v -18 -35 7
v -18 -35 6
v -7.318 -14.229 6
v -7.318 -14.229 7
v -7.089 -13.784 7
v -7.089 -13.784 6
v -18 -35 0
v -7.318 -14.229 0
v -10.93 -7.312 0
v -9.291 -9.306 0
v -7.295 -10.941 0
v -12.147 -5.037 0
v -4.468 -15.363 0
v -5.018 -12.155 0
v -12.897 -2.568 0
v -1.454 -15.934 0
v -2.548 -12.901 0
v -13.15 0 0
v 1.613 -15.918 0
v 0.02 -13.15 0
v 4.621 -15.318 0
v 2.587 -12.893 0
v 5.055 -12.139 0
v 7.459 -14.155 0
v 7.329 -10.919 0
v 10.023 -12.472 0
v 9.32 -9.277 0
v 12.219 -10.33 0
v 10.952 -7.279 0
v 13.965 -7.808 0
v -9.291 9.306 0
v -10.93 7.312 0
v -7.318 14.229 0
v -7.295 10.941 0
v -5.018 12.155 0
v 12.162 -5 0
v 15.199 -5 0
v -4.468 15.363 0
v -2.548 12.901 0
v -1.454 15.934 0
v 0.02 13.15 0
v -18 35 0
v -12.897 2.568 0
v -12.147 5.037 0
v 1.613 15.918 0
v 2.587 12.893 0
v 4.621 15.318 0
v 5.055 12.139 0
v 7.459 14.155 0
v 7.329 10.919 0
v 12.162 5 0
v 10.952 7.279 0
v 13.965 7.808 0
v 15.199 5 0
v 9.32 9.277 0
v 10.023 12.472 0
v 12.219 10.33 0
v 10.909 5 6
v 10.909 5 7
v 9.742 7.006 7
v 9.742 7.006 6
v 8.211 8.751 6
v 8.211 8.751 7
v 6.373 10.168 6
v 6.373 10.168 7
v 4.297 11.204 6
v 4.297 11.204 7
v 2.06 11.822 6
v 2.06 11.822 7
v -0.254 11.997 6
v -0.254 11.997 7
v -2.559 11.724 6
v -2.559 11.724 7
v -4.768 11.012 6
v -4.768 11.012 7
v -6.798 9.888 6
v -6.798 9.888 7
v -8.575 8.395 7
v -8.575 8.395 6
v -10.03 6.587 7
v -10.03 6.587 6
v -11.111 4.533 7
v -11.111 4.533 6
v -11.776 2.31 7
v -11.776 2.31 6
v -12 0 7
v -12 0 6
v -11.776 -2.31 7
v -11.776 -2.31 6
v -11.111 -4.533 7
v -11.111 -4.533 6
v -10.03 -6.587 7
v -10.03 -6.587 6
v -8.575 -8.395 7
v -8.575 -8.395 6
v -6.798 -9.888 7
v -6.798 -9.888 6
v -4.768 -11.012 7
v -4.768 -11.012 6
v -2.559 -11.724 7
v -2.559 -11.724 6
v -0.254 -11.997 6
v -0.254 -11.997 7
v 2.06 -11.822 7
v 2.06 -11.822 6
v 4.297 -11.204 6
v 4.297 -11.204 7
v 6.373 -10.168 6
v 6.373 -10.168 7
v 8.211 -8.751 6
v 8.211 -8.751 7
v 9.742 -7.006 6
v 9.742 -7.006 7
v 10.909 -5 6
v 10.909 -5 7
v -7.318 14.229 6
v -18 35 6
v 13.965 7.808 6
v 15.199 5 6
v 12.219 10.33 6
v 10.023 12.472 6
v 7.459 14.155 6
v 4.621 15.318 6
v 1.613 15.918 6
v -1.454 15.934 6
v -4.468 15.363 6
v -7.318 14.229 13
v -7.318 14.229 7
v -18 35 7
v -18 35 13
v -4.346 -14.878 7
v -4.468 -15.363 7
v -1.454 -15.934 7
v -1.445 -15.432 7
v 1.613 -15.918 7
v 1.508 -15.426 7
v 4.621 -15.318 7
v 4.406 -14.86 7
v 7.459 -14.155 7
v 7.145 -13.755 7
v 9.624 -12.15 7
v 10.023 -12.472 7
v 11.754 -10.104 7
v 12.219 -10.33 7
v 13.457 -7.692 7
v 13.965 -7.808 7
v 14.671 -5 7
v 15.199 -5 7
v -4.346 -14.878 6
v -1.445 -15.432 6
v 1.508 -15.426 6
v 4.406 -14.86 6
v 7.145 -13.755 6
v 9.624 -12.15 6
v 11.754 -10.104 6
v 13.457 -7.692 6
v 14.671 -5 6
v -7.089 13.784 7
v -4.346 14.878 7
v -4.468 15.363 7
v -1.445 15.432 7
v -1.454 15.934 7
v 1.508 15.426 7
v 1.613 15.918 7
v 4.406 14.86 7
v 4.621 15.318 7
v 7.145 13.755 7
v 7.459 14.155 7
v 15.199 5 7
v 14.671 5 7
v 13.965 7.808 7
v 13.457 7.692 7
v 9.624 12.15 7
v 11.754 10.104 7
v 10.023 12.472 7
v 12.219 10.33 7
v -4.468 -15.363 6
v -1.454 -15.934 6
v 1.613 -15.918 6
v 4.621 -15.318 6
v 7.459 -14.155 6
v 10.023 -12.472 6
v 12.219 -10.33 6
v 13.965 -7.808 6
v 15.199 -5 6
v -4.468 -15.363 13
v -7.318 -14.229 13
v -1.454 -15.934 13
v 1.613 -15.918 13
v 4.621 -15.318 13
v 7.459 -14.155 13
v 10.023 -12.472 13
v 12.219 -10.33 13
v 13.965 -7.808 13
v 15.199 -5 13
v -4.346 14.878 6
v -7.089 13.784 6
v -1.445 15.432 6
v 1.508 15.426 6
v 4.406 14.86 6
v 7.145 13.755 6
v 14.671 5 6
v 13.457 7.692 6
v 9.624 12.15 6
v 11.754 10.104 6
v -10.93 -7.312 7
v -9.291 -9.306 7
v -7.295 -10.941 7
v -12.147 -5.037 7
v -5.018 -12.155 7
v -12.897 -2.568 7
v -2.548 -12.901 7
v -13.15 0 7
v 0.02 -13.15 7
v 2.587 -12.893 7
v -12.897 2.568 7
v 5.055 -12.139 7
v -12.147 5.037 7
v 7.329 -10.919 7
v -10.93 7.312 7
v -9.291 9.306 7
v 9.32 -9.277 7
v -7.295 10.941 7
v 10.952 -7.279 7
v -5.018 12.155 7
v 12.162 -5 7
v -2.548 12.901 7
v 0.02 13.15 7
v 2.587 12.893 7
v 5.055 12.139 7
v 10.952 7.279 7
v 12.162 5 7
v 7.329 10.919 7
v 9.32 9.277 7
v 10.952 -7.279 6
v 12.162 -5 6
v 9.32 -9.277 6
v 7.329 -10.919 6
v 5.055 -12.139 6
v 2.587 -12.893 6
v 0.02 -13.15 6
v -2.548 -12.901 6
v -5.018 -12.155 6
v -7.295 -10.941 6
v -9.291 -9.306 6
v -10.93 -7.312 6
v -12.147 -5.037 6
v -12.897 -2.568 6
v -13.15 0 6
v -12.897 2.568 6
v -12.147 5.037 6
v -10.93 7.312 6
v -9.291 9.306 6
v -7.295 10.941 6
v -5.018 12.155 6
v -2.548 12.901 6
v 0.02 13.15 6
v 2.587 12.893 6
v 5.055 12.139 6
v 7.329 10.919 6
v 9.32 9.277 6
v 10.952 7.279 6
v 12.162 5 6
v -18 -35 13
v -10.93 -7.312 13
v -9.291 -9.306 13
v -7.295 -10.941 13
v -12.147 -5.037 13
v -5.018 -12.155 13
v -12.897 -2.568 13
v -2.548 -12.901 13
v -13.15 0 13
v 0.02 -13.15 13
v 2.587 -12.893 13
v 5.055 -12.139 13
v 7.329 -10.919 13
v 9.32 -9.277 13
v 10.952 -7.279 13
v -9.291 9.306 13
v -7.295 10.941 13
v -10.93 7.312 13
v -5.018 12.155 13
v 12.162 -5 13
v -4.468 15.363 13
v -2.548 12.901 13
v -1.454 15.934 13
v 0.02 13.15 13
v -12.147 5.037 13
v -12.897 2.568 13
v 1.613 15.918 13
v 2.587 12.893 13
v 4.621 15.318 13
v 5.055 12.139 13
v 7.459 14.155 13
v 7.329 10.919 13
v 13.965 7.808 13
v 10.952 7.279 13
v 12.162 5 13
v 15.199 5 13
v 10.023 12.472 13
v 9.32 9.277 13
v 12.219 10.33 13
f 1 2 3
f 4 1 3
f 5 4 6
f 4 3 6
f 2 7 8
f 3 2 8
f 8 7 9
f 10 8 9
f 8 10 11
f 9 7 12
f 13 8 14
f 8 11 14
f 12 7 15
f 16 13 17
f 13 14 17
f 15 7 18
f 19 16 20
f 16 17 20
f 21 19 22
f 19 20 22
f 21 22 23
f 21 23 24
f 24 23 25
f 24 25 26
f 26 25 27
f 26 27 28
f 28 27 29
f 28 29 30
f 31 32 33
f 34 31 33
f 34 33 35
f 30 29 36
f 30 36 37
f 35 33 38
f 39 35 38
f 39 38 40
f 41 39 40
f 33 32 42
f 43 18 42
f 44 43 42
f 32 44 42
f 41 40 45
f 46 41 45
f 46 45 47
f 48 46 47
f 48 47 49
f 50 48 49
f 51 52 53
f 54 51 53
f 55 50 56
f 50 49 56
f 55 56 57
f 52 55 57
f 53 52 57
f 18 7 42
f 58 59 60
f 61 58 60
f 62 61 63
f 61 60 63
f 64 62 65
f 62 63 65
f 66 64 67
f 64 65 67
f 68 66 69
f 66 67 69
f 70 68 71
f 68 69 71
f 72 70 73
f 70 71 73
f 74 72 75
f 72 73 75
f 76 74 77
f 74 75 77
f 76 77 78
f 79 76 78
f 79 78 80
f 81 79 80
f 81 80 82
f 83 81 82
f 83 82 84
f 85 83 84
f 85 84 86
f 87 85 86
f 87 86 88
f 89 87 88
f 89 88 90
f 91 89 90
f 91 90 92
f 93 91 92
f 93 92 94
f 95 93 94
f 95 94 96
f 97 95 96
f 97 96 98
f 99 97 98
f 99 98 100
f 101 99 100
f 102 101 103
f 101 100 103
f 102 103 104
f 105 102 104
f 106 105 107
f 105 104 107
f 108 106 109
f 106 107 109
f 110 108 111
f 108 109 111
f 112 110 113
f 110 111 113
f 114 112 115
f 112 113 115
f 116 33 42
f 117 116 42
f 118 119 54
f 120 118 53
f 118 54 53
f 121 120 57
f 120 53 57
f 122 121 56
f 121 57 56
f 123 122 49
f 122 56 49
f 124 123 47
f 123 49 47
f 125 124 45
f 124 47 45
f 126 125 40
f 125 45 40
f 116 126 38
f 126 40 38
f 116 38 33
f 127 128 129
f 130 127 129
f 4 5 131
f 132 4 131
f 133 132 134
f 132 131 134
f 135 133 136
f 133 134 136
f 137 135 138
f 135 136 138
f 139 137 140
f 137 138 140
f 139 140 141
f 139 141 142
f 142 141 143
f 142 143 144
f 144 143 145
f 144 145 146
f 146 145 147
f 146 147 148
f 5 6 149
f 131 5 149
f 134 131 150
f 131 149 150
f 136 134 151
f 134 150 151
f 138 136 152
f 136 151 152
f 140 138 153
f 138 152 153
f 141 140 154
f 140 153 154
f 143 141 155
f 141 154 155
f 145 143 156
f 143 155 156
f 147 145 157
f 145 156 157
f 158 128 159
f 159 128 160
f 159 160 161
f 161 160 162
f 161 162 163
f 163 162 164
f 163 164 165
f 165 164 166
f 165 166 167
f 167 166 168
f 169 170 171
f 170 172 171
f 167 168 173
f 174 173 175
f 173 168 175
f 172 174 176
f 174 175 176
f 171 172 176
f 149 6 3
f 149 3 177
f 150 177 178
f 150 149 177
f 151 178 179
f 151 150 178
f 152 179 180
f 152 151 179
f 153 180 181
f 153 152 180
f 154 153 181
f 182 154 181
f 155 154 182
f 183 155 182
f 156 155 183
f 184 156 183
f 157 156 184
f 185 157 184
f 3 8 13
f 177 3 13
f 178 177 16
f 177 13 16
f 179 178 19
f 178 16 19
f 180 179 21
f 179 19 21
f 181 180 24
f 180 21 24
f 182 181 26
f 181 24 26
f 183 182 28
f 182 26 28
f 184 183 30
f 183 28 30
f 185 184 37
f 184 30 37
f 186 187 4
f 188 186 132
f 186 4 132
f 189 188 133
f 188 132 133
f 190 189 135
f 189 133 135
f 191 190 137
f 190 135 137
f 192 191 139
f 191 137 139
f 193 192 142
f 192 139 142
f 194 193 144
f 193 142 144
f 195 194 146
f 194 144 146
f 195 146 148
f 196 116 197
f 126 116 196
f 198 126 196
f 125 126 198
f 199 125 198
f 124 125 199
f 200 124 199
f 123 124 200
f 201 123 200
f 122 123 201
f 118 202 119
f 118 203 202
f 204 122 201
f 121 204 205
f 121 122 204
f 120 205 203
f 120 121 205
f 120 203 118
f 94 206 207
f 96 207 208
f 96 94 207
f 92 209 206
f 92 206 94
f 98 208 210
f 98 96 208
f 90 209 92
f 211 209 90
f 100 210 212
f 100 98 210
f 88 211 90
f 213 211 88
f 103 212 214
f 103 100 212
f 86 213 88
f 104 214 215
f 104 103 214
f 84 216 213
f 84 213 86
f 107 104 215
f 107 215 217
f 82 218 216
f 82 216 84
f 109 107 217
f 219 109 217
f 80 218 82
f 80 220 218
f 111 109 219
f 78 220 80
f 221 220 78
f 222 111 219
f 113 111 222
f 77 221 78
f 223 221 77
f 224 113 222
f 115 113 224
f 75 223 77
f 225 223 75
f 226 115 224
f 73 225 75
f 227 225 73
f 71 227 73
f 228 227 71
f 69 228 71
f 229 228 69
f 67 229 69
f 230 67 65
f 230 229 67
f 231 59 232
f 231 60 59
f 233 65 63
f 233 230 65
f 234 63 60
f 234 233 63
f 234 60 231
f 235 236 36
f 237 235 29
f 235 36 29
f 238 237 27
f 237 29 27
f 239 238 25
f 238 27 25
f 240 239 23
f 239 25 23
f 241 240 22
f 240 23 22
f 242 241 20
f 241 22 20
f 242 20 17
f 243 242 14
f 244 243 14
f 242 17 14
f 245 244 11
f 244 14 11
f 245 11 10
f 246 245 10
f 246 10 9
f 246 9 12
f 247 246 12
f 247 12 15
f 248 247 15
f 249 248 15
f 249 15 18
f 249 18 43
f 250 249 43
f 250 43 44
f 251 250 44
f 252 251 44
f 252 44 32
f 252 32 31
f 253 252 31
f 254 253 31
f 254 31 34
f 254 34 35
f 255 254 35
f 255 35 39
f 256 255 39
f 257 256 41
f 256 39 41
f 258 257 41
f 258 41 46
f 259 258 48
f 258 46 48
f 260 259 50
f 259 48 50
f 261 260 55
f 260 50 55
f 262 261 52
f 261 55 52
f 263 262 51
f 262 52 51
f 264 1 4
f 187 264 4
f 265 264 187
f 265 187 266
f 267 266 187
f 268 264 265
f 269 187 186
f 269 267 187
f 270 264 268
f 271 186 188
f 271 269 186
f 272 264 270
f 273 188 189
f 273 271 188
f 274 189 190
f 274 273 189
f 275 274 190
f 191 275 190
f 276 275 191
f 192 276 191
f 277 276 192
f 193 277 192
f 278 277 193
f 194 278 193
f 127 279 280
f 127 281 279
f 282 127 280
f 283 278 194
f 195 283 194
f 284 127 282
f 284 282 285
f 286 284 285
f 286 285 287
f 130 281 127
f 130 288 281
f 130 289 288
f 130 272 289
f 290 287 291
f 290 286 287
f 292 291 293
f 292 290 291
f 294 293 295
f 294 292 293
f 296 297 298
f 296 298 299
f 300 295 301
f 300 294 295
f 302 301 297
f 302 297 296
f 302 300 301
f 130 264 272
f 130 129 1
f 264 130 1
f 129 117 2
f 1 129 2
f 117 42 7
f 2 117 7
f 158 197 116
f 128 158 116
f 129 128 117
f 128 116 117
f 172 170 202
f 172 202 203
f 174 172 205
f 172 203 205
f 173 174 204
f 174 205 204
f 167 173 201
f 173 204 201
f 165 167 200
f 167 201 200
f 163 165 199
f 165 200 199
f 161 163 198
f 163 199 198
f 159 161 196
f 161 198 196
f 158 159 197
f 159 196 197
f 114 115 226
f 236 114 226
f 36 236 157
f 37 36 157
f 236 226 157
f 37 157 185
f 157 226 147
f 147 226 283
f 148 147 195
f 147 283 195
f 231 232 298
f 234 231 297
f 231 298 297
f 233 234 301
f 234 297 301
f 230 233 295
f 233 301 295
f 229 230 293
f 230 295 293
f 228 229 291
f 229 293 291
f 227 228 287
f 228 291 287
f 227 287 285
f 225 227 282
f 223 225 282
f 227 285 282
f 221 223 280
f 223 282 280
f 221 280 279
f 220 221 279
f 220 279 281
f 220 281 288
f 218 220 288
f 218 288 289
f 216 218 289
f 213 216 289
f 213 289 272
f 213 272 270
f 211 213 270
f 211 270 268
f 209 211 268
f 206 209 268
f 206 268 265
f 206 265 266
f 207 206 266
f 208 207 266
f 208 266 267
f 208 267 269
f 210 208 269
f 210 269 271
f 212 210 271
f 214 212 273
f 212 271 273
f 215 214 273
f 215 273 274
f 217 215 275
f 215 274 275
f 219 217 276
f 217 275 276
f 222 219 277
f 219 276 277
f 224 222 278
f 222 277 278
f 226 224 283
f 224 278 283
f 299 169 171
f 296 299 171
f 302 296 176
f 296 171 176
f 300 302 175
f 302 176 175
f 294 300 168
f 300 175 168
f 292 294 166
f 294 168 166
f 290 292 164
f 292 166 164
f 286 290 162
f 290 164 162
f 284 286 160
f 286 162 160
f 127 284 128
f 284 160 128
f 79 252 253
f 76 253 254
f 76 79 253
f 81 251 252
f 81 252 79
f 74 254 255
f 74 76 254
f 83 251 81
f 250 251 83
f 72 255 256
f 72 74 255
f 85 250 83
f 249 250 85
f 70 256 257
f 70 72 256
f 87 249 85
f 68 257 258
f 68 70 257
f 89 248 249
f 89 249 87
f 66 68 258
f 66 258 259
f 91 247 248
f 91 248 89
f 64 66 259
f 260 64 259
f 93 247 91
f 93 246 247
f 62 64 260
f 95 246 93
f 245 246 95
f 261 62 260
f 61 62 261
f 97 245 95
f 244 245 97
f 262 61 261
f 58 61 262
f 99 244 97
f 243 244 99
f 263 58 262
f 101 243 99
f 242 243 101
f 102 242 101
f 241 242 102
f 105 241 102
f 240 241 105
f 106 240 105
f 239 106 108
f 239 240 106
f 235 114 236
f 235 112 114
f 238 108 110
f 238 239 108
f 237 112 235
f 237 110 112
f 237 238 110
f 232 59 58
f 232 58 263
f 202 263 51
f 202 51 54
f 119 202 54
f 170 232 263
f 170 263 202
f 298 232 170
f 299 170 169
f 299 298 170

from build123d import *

# Parameters (mm, degrees)
PAD_DEPTH       = 6
PAD001_DEPTH    = 1
PAD002_DEPTH    = 6
SKETCH003_R     = 13.15
POCKET_DEPTH    = 6
SKETCH004_R     = 13.15
POCKET001_DEPTH = 6
SKETCH005_R     = 12
POCKET002_DEPTH = 1
SKETCH006_W     = 6
SKETCH006_H     = 10
POCKET003_DEPTH = 13


with BuildPart() as part:
    # Sketch → Pad (new body)
    with BuildSketch(Plane.XY):
        with BuildLine():
            Line((-7.317568, 14.228605), (-18, 35))
            Line((-18, 35), (-18, -35))
            Line((-18, -35), (-7.317568, -14.228605))
            ThreePointArc((-7.317568, -14.228605), (16, 0), (-7.317568, 14.228605))
        make_face()
    extrude(amount=PAD_DEPTH)

    # Sketch001 (on Face6 of Pad) → Pad001 (join)
    with BuildSketch(Plane.XY.offset(6)):
        with BuildLine():
            Line((-7.088894, 13.783961), (-18, 35))
            Line((-18, 35), (-18, -35))
            Line((-18, -35), (-7.088894, -13.783961))
            ThreePointArc((-7.088894, -13.783961), (15.5, 0), (-7.088894, 13.783961))
        make_face()
    extrude(amount=PAD001_DEPTH)

    # Sketch002 (on Face10 of Pad001) → Pad002 (join)
    with BuildSketch(Plane.XY.offset(7)):
        with BuildLine():
            Line((-7.317568, 14.228605), (-18, 35))
            Line((-18, 35), (-18, -35))
            Line((-18, -35), (-7.317568, -14.228605))
            ThreePointArc((-7.317568, -14.228605), (16, 0), (-7.317568, 14.228605))
        make_face()
    extrude(amount=PAD002_DEPTH)

    # Sketch003 (on Face4 of Pad002) → Pocket (cut)
    with BuildSketch(Plane(origin=(0, 0, 0), x_dir=(1, 0, 0), z_dir=(0, 0, -1))):
        Circle(SKETCH003_R)
    extrude(amount=-POCKET_DEPTH, mode=Mode.SUBTRACT)

    # Sketch004 (on Face17 of Pocket) → Pocket001 (cut)
    with BuildSketch(Plane.XY.offset(13)):
        Circle(SKETCH004_R)
    extrude(amount=-POCKET001_DEPTH, mode=Mode.SUBTRACT)

    # Sketch005 (on Face20 of Pocket001) → Pocket002 (cut)
    with BuildSketch(Plane.XY.offset(7)):
        Circle(SKETCH005_R)
    extrude(amount=-POCKET002_DEPTH, mode=Mode.SUBTRACT)

    # Sketch006 (on Face17 of Pocket002) → Pocket003 (cut)
    with BuildSketch(Plane.XY.offset(13)):
        with Locations((13, 0)):
            Rectangle(SKETCH006_W, SKETCH006_H)
    extrude(amount=-POCKET003_DEPTH, mode=Mode.SUBTRACT)


solid = part.part
